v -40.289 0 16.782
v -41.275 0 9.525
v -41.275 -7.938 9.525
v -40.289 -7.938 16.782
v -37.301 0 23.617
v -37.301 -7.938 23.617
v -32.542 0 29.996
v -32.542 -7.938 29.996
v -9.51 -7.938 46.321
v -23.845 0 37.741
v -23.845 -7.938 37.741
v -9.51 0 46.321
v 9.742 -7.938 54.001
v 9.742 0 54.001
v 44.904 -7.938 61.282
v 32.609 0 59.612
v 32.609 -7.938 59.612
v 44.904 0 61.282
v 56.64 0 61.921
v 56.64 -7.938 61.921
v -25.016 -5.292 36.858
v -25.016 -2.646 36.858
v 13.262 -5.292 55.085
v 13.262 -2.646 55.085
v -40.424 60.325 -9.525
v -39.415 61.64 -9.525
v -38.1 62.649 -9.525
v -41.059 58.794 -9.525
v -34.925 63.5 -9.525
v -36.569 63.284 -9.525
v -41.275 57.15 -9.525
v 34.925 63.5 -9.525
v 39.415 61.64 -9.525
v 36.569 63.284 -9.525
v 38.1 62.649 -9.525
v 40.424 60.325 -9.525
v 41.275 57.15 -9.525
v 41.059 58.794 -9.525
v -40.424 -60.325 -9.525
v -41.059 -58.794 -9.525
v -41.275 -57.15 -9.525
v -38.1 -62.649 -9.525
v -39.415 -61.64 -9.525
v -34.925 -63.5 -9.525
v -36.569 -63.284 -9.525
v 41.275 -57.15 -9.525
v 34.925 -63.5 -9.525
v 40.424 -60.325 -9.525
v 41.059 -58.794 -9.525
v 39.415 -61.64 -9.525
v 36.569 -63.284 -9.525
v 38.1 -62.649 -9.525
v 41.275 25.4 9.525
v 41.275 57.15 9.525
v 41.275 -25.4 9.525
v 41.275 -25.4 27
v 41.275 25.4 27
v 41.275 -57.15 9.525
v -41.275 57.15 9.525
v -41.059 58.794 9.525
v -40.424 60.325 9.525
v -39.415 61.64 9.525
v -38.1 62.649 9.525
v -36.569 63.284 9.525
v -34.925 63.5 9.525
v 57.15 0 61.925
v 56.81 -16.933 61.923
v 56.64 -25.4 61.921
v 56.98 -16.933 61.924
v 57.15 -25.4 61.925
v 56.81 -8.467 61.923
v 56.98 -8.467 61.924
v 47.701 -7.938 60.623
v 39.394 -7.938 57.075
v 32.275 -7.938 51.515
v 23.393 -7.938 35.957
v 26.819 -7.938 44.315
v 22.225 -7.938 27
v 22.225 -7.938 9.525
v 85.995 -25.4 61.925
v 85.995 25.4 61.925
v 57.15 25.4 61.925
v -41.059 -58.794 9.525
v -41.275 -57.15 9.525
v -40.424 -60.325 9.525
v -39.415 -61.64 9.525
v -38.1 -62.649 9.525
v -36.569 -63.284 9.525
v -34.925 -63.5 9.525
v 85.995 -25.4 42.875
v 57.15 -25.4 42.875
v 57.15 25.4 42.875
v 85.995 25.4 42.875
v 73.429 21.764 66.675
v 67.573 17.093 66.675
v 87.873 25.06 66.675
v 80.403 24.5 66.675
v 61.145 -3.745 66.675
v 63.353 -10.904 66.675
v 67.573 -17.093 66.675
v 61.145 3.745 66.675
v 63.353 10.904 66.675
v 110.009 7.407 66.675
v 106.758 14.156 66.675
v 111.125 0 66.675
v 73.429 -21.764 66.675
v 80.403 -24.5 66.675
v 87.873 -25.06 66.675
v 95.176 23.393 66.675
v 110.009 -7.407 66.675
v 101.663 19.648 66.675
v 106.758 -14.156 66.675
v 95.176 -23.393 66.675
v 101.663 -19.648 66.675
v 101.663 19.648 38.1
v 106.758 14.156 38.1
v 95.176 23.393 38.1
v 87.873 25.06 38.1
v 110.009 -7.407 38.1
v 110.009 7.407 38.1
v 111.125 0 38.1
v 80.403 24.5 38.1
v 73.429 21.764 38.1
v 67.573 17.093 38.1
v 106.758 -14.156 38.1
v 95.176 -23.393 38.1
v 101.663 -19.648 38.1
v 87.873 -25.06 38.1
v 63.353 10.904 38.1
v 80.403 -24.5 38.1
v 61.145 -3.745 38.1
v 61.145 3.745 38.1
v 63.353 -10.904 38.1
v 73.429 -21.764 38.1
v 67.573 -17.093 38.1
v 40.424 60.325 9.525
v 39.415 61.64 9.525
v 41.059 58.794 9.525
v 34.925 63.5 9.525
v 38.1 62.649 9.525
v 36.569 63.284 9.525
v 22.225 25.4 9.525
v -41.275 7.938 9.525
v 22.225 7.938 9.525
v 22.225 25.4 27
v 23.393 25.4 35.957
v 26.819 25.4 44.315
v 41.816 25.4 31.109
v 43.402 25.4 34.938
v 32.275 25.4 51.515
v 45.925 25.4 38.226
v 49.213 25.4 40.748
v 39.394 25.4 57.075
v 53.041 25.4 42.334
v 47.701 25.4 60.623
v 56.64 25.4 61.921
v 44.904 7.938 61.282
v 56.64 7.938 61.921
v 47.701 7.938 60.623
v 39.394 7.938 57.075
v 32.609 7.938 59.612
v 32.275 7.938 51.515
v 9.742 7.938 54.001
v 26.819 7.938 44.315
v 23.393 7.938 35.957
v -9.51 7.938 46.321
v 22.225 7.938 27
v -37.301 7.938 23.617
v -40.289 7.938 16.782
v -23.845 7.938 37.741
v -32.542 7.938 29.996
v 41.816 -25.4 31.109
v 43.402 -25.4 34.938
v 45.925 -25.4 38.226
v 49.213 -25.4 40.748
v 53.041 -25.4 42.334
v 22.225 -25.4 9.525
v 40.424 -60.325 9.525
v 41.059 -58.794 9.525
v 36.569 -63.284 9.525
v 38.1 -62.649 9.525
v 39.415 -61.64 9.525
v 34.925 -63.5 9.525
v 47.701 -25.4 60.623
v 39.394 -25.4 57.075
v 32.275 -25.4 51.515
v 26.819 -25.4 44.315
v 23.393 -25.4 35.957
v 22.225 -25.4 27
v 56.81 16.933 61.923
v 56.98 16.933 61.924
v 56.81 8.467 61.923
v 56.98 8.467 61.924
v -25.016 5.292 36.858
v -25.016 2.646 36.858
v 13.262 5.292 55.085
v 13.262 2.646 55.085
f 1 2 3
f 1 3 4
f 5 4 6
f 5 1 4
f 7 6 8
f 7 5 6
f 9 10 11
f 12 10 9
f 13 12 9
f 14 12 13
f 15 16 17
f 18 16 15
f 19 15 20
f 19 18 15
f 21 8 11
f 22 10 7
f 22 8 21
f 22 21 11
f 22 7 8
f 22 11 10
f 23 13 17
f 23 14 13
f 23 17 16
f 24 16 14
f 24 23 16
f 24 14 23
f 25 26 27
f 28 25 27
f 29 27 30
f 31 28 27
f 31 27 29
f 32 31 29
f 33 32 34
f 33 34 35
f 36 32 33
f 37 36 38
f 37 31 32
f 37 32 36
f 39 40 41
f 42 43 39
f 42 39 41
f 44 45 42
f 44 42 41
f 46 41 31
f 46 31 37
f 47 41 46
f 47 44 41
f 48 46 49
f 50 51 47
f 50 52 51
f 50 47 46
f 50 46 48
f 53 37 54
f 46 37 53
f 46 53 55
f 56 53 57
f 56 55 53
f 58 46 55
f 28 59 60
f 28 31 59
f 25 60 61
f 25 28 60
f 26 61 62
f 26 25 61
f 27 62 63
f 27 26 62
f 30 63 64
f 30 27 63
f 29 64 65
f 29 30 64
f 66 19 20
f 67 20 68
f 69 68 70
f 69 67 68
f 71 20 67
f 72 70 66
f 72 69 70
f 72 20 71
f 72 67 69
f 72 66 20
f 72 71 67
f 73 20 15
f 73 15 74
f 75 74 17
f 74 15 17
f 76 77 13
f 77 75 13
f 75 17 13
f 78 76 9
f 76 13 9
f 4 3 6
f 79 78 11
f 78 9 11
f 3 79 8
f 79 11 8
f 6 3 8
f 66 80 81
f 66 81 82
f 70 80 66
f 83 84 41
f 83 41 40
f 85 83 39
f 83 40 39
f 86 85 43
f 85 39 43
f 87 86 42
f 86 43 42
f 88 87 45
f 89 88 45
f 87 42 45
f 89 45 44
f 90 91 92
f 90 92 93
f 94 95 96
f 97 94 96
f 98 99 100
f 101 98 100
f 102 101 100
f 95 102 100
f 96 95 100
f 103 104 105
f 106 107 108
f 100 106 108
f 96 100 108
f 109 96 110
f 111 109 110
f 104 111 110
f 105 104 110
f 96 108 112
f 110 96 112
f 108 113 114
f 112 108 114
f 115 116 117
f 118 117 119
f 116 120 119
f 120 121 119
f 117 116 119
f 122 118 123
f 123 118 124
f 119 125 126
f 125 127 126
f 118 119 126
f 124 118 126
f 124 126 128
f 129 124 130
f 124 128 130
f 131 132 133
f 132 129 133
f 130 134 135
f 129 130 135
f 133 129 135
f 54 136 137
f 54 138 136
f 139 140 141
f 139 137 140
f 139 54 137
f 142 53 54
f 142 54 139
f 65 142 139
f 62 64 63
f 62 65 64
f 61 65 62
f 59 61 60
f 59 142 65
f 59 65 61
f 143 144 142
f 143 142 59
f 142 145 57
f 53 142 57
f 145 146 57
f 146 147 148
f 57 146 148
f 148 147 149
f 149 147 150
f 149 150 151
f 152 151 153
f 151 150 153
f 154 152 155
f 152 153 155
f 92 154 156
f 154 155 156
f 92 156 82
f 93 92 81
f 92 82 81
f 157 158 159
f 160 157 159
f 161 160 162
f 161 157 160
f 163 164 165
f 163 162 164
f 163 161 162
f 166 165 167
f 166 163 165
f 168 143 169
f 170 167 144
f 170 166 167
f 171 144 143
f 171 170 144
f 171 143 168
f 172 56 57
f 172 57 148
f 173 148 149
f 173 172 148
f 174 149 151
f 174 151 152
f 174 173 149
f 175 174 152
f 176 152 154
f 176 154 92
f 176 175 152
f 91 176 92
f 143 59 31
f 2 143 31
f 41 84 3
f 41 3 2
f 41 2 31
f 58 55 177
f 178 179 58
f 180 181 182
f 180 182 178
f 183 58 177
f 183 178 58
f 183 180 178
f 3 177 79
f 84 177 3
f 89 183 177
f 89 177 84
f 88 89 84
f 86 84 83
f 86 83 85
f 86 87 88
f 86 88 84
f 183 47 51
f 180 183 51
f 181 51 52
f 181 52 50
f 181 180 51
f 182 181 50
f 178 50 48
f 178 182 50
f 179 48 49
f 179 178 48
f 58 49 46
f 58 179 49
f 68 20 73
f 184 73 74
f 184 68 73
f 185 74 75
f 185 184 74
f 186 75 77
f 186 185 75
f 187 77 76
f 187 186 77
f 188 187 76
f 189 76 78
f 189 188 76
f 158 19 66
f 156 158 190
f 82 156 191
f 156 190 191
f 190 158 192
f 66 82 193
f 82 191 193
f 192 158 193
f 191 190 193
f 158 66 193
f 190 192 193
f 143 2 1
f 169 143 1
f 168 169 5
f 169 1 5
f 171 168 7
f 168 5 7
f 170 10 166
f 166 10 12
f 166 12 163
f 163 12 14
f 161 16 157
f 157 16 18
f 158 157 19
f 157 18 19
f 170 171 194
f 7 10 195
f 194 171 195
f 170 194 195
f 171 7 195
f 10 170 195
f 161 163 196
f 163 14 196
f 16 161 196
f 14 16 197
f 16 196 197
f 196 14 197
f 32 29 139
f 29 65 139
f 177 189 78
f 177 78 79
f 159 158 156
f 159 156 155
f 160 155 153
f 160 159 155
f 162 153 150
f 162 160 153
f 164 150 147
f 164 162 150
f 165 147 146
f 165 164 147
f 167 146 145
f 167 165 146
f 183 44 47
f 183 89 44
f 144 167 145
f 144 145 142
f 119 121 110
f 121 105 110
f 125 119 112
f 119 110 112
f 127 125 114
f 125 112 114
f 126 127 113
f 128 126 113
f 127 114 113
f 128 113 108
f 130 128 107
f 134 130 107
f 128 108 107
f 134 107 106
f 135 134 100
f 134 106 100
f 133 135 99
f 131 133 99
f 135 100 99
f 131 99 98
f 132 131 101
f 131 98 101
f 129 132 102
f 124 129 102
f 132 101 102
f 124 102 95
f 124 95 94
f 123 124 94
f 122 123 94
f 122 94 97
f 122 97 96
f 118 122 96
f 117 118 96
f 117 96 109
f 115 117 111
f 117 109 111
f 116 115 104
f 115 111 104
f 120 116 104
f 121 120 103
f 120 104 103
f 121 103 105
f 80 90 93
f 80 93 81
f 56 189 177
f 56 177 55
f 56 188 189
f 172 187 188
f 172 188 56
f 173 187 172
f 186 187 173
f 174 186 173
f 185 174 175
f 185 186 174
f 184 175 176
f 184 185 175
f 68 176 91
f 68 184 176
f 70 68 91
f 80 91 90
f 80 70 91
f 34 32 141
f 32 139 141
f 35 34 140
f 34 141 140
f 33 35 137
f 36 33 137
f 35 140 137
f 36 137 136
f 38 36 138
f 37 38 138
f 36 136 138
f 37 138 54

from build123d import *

# Parameters (mm, degrees)
F1_DEPTH = 63.5
F0_W     = 25.6695565462
F0_H     = 19.05
F2_DEPTH = 25.4
F3_DEPTH = 7.9375
F5_R     = 6.35


with BuildPart() as f1:
    # F0 (on Front) → F1 (new body, symmetric)
    with BuildSketch(Plane.XZ):
        Polygon((-41.275, -9.525), (41.275, -9.525), (41.275, 9.525), (22.225, 9.525), (-41.275, 9.525), align=None)
    extrude(amount=F1_DEPTH, both=True)

    # F0 (on Front) → F2 (join, symmetric)
    with BuildSketch(Plane.XZ):
        with BuildLine():
            Line((22.225, 9.525), (41.275, 9.525))
            Line((41.275, 9.525), (41.275, 27.0002))
            ThreePointArc((41.275, 27.0002), (45.9246798487, 38.2255201513), (57.15, 42.8752))
            Line((57.15, 42.8752), (60.325, 42.8752))
            Line((60.325, 42.8752), (60.325, 61.9252))
            Line((60.325, 61.9252), (57.15, 61.9252))
            add(Edge.make_bspline(
                [(56.6400088012, 61.9214762364), (56.8103246779, 61.9230843087), (56.9803236617, 61.9243258221), (57.15, 61.9252)],
                knots=[111.0351315252, 111.0351315252, 111.0351315252, 111.0351315252, 111.5045361635, 111.5045361635, 111.5045361635, 111.5045361635], degree=3))
            ThreePointArc((56.6400088012, 61.9214762364), (32.2746400266, 51.5149321256), (22.225, 27.0002))
            Line((22.225, 27.0002), (22.225, 9.525))
        make_face()
        with Locations((73.1597782731, 52.4002)):
            Rectangle(F0_W, F0_H)
    extrude(amount=F2_DEPTH, both=True)

    # F0 (on Front) → F3 (join, symmetric)
    with BuildSketch(Plane.XZ):
        with BuildLine():
            add(Edge.make_bspline(
                [(-41.275, 9.525), (-41.6658055269, 40.650509894), (16.3527082061, 61.5410954073), (56.6400088012, 61.9214762364)],
                knots=[0, 0, 0, 0, 111.0351315252, 111.0351315252, 111.0351315252, 111.0351315252], degree=3))
            Line((-41.275, 9.525), (22.225, 9.525))
            Line((22.225, 9.525), (22.225, 27.0002))
            ThreePointArc((22.225, 27.0002), (32.2746400266, 51.5149321256), (56.6400088012, 61.9214762364))
        make_face()
    extrude(amount=F3_DEPTH, both=True)

    # F5
    f5_edges = [f1.edges().sort_by_distance(p)[0] for p in [
        (41.275, -63.5, 0),
        (-41.275, -63.5, 0),
        (41.275, 63.5, 0),
        (-41.275, 63.5, 0),
    ]]
    fillet(f5_edges, radius=F5_R)


with BuildPart() as f4:
    # F0 (on Front) → F4 (revolve)
    with BuildSketch(Plane.XZ):
        Polygon((85.9945565462, 61.9252), (85.9945565462, 42.8752), (85.9945565462, 38.1), (111.125, 38.1), (111.125, 66.675), (85.9945565462, 66.675), align=None)
    revolve(axis=Axis((85.9945565462, 0, 52.4002), (0, 0, -1)))


solid = Compound([f1.part, f4.part])
